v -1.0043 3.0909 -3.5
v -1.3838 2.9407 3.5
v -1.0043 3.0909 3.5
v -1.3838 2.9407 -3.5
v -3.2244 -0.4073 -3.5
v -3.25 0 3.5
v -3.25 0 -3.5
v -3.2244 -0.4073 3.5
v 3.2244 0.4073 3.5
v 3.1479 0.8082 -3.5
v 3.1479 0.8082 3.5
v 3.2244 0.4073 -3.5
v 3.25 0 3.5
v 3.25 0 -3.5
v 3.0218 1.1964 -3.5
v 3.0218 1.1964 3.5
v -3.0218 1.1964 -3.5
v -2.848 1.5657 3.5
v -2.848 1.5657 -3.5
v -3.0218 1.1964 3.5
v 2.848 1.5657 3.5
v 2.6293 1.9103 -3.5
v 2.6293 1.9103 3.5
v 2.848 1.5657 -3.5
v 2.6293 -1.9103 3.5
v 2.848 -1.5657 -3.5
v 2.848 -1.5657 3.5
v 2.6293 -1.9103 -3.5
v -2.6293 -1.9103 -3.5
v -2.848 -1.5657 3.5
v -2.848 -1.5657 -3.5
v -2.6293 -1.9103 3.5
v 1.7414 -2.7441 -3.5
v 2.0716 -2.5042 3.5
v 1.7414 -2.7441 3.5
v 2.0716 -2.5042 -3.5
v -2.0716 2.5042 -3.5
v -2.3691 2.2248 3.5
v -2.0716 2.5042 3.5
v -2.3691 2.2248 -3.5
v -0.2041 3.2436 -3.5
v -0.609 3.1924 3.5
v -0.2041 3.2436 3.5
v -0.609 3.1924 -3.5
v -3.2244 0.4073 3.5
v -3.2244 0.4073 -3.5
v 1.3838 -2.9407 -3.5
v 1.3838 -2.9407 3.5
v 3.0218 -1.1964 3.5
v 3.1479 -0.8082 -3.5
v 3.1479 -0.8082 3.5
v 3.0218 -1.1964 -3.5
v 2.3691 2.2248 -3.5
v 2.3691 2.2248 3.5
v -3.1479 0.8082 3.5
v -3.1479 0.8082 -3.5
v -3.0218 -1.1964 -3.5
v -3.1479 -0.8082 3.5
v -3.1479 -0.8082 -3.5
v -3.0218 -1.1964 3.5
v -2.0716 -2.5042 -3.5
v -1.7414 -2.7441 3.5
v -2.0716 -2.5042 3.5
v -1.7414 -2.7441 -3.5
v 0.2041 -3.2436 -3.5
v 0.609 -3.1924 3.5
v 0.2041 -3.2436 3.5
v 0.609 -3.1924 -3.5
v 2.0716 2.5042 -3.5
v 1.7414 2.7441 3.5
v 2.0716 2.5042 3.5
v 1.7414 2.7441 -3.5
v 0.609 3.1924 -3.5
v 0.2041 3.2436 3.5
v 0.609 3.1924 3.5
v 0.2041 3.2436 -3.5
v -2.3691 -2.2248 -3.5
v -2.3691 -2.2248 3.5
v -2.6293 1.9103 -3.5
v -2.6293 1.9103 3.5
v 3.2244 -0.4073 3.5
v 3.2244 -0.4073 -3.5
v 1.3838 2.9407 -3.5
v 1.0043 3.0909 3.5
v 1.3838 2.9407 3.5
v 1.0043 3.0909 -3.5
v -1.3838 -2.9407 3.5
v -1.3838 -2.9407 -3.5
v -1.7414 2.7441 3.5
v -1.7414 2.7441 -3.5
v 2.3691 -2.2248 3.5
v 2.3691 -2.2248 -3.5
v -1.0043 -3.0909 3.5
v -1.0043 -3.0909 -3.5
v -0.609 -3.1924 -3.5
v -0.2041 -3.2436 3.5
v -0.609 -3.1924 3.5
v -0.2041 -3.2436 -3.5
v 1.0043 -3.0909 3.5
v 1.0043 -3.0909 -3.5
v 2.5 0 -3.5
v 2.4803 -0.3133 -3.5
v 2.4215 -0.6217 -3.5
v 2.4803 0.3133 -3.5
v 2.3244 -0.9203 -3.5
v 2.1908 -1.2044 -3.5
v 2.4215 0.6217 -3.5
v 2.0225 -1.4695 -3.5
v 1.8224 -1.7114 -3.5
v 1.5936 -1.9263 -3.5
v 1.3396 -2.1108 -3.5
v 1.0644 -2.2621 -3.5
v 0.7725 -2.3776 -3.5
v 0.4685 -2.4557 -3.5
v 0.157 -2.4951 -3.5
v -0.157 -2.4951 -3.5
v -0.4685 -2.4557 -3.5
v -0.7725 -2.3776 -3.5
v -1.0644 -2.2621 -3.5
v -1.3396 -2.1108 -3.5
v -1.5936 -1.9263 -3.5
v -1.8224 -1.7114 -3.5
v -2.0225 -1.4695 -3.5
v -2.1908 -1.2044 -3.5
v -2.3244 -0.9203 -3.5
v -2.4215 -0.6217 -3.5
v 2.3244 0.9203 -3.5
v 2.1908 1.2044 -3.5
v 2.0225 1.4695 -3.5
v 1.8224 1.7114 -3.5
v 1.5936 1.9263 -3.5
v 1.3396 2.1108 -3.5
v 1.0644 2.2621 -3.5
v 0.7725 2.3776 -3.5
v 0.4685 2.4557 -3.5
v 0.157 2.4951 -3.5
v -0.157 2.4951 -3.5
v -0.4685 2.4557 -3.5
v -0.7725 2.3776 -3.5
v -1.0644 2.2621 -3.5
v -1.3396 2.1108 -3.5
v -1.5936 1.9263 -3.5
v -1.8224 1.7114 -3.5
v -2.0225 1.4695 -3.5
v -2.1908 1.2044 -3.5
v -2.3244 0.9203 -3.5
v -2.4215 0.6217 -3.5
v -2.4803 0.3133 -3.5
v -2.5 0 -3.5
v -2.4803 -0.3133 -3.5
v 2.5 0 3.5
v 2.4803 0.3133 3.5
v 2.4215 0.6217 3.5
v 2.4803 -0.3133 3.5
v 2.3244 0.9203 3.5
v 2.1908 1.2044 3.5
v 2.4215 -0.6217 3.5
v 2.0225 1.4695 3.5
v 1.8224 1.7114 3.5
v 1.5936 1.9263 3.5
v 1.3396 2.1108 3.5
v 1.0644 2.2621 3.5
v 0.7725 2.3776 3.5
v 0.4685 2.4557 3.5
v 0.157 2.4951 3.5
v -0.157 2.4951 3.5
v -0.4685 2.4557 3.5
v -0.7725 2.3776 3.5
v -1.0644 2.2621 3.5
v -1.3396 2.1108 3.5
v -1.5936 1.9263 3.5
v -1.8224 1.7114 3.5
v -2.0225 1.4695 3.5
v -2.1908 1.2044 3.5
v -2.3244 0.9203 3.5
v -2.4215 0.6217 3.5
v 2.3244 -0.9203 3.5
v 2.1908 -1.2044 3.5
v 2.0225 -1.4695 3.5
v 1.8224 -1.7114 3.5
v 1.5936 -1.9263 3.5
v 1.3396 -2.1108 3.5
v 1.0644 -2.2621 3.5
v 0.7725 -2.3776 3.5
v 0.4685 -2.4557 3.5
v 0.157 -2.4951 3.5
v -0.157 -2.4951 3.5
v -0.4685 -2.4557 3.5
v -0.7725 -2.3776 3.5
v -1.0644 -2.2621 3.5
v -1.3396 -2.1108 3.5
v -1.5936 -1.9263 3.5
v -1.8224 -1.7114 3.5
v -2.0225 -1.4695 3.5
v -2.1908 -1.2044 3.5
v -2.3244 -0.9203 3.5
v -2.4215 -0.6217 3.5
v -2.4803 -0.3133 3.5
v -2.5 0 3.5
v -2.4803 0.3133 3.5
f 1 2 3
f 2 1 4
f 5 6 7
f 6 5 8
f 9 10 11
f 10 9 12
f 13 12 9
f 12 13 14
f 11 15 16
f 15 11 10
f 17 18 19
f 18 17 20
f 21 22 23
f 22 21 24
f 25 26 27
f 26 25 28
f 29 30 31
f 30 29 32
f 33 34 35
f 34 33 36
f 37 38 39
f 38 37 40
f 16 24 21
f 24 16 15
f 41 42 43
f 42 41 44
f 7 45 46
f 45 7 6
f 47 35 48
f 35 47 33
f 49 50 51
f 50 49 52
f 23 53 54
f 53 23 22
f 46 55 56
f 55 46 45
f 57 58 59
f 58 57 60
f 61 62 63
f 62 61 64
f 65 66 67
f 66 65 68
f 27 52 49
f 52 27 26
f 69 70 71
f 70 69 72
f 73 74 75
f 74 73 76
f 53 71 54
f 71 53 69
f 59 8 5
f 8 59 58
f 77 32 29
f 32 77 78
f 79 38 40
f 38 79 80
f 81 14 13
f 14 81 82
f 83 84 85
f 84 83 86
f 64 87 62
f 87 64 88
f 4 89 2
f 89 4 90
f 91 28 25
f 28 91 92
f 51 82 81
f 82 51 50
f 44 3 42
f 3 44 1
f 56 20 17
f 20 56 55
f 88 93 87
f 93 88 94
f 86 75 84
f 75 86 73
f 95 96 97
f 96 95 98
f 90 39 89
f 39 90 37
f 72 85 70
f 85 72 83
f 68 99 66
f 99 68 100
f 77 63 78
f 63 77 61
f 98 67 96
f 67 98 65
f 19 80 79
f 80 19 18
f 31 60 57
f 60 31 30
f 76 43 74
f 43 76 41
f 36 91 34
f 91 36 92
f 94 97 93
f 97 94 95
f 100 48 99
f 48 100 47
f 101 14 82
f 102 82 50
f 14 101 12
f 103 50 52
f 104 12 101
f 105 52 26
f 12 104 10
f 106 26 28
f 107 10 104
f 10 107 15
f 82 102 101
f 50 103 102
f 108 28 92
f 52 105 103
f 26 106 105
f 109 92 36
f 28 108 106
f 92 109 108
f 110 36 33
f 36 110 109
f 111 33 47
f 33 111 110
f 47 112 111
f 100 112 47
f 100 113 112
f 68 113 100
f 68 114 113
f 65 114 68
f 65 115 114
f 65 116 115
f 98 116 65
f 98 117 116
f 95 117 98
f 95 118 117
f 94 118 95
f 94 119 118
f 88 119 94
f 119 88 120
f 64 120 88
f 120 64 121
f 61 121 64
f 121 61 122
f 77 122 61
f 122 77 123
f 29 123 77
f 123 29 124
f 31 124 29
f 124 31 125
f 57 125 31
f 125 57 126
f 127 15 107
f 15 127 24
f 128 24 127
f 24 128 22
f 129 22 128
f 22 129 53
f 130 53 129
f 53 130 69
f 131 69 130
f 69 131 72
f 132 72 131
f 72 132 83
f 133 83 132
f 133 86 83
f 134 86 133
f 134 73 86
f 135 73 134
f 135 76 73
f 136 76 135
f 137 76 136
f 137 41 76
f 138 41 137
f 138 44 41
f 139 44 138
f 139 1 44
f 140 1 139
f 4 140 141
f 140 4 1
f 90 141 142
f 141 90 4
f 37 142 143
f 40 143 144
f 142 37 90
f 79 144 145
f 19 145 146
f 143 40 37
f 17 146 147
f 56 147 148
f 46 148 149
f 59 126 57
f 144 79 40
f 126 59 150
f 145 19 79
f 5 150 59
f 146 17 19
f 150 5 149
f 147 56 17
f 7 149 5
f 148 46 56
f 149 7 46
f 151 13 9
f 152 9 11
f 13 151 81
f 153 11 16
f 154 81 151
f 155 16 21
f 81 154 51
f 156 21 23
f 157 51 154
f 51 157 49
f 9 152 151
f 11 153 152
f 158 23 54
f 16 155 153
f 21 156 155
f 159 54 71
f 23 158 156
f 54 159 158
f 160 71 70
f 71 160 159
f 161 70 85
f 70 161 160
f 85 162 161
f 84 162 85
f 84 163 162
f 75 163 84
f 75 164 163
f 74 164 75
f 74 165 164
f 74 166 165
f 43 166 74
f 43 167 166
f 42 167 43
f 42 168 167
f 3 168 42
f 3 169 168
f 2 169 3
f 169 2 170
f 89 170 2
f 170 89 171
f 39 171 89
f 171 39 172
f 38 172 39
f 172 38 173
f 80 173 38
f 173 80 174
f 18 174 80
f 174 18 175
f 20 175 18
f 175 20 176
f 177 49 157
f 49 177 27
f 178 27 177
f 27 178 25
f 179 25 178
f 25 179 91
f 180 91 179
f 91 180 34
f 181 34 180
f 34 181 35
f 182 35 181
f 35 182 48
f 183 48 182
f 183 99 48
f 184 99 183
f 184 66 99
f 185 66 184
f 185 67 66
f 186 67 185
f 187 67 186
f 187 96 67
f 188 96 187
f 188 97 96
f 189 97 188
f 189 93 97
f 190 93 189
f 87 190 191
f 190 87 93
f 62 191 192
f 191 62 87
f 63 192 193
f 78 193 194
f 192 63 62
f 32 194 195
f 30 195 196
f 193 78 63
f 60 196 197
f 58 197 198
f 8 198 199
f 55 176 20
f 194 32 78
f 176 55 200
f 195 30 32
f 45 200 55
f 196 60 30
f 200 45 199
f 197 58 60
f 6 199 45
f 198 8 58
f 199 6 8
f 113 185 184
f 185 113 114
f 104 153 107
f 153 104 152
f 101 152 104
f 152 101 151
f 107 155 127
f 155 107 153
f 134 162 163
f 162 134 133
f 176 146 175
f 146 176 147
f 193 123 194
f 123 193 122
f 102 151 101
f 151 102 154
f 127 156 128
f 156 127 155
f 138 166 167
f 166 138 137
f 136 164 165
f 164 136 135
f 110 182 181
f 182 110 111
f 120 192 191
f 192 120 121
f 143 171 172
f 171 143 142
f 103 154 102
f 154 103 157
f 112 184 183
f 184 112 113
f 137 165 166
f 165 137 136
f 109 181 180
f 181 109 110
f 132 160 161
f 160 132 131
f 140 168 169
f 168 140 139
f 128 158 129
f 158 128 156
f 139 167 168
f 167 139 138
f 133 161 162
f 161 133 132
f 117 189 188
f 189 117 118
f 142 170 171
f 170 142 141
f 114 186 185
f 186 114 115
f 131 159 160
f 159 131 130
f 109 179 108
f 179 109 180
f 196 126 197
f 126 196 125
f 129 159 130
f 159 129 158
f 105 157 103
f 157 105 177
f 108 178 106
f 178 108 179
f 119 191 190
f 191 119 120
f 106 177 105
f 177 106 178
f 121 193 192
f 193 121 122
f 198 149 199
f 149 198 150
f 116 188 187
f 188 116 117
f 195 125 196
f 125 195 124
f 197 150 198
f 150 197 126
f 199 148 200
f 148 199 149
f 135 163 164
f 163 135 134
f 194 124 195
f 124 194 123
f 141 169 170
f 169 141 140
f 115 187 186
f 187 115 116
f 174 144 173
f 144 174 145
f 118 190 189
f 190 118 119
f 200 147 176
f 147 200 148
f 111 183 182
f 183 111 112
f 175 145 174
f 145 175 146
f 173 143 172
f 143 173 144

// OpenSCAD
$fn = 50;


difference() {
	union() {
		translate(v = [0, 0, -3.5000000000]) {
			cylinder(h = 7, r = 3.2500000000);
		}
	}
	union() {
		translate(v = [0, 0, -100.0000000000]) {
			cylinder(h = 200, r = 2.5000000000);
		}
	}
}
